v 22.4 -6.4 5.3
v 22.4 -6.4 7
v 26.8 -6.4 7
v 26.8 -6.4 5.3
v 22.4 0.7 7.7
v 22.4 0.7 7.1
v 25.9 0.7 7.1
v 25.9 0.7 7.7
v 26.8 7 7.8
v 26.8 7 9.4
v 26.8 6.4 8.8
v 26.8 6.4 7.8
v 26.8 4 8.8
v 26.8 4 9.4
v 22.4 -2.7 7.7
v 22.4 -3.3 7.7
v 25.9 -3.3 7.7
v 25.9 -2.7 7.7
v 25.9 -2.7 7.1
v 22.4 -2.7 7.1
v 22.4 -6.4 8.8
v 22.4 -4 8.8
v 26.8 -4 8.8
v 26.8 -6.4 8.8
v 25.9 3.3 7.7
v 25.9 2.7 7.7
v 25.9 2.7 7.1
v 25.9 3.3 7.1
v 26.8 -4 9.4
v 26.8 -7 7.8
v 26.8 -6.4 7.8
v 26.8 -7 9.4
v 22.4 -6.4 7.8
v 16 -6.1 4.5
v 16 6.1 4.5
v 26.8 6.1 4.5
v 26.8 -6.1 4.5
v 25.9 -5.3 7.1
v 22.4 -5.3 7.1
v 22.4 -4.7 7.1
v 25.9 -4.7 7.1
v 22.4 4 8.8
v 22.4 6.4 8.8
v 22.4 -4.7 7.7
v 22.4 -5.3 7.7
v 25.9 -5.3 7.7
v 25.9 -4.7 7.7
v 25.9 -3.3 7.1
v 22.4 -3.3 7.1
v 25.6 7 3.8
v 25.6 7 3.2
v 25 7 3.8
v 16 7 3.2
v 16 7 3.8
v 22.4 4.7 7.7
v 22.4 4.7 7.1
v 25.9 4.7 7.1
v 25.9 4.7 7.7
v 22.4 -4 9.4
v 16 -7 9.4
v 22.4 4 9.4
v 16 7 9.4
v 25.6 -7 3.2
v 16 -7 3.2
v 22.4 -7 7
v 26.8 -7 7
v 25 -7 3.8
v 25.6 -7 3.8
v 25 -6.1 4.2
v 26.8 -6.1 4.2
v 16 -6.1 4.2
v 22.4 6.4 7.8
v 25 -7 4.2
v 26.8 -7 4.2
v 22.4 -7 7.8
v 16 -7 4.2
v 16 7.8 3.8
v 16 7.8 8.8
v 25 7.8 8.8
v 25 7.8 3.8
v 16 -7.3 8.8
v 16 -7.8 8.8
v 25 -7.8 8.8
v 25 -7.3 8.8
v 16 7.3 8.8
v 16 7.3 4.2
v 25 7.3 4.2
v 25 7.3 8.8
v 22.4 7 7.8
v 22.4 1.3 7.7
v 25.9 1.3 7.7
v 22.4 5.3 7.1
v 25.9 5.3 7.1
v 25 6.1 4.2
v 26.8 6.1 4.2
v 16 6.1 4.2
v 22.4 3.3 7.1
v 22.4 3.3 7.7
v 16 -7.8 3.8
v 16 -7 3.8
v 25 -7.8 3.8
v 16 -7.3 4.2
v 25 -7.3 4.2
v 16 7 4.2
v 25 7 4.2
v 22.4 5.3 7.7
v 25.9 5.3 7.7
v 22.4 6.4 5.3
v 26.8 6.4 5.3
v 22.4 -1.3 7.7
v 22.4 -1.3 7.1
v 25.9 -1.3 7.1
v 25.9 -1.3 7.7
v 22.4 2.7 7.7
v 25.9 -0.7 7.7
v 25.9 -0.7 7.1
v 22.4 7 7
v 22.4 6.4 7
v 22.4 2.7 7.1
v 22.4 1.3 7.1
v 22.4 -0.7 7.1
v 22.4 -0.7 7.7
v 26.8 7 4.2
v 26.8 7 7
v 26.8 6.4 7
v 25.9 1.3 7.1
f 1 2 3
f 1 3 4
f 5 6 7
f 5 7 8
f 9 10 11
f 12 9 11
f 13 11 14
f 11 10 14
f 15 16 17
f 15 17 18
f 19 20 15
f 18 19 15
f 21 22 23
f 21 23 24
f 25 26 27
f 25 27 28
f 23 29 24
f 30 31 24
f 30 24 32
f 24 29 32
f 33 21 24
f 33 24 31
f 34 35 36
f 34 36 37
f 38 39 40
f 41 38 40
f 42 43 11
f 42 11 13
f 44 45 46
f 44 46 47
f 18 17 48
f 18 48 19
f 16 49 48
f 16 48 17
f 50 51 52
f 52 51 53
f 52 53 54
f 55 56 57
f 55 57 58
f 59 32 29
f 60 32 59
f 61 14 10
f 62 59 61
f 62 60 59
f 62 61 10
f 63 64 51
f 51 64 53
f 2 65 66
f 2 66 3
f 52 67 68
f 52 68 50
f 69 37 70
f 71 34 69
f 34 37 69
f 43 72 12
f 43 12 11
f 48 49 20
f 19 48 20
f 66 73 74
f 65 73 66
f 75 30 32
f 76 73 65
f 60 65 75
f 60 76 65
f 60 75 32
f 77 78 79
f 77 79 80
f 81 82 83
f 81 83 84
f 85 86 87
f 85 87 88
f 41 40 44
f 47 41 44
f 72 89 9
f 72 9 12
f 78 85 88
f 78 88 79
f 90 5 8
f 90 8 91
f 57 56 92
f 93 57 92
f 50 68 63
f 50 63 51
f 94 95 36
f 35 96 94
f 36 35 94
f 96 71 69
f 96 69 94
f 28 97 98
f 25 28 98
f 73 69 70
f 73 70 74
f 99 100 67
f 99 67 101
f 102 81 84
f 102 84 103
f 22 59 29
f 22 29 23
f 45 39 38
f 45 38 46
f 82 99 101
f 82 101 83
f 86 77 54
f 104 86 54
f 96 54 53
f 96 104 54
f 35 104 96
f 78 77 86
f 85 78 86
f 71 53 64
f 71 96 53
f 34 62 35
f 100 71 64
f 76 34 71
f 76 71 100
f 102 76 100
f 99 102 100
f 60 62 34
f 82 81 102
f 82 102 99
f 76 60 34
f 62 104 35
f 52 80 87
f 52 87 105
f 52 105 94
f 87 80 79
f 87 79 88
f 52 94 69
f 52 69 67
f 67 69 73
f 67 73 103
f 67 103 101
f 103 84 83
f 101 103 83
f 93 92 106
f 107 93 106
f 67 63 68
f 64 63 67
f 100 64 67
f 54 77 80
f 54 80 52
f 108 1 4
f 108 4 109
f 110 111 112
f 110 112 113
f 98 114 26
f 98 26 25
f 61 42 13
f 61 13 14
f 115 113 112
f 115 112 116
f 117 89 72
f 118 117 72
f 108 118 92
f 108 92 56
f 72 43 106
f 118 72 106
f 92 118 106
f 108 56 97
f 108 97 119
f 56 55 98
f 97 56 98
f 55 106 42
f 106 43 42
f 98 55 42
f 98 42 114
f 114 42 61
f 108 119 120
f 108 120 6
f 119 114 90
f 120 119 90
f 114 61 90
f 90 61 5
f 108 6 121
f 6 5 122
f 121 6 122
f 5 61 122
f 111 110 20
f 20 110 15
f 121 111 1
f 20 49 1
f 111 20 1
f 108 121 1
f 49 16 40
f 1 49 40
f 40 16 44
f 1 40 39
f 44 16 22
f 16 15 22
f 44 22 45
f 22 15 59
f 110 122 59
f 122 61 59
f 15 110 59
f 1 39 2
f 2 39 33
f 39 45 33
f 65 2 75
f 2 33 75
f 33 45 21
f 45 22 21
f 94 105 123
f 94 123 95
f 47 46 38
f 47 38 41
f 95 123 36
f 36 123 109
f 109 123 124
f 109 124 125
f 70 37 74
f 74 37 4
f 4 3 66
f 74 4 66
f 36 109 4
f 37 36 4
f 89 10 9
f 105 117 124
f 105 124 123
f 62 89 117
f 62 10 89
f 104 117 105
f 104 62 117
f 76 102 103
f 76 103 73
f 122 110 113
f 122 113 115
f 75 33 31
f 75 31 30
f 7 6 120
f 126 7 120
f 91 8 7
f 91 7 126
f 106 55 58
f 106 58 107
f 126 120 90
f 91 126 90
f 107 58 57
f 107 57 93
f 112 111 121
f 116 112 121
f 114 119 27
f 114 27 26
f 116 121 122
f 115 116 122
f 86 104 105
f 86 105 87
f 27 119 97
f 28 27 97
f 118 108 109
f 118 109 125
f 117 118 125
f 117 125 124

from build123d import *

# Parameters (mm, degrees)
SKETCH006_W  = 14
SKETCH006_H  = 0.6
PAD018_DEPTH = 9.6
PAD019_DEPTH = 9
PAD020_DEPTH = 6.4
PAD021_DEPTH = 4.4
SKETCH010_W  = 0.6
SKETCH010_H  = 0.6
PAD022_DEPTH = 3.5


with BuildPart() as part:
    # Sketch006 → Pad018 (new body)
    with BuildSketch(Plane.YZ.offset(16)):
        with Locations((0, 3.5)):
            Rectangle(SKETCH006_W, SKETCH006_H)
    extrude(amount=PAD018_DEPTH)

    # Sketch036 → Pad019 (join)
    with BuildSketch(Plane.YZ.offset(16)):
        Polygon((7.8, 8.8), (7.8, 3.8), (0.5, 3.8), (0, 3.4), (-0.5, 3.8), (-7.8, 3.8), (-7.8, 8.8), (-7.3, 8.8), (-7.3, 4.2), (7.3, 4.2), (7.3, 8.8), align=None)
    extrude(amount=PAD019_DEPTH)

    # Sketch037 → Pad020 (join)
    with BuildSketch(Plane.YZ.offset(16)):
        Polygon((-7, 9.4), (7, 9.4), (7, 4.2), (6.1, 4.2), (6.1, 4.5), (-6.1, 4.5), (-6.1, 4.2), (-7, 4.2), align=None)
    extrude(amount=PAD020_DEPTH)

    # Sketch038 (on Face21 of Pad020) → Pad021 (join)
    with BuildSketch(Plane.YZ.offset(22.4)):
        Polygon((-7, 9.4), (-4, 9.4), (-4, 8.8), (-6.4, 8.8), (-6.4, 7.8), (-7, 7.8), align=None)
        Polygon((4, 9.4), (7, 9.4), (7, 7.8), (6.4, 7.8), (6.4, 8.8), (4, 8.8), align=None)
        Polygon((7, 7), (7, 4.2), (6.1, 4.2), (6.1, 4.5), (-6.1, 4.5), (-6.1, 4.2), (-7, 4.2), (-7, 7), (-6.4, 7), (-6.4, 5.3), (6.4, 5.3), (6.4, 7), align=None)
    extrude(amount=PAD021_DEPTH)

    # Sketch010 (on Face35 of Pad021) → Pad022 (join)
    with BuildSketch(Plane.YZ.offset(22.4)):
        with Locations((-5, 7.4)):
            Rectangle(SKETCH010_W, SKETCH010_H)
        with Locations((-3, 7.4)):
            Rectangle(SKETCH010_W, SKETCH010_H)
        with Locations((-1, 7.4)):
            Rectangle(SKETCH010_W, SKETCH010_H)
        with Locations((1, 7.4)):
            Rectangle(SKETCH010_W, SKETCH010_H)
        with Locations((3, 7.4)):
            Rectangle(SKETCH010_W, SKETCH010_H)
        with Locations((5, 7.4)):
            Rectangle(SKETCH010_W, SKETCH010_H)
    extrude(amount=PAD022_DEPTH)


solid = part.part
